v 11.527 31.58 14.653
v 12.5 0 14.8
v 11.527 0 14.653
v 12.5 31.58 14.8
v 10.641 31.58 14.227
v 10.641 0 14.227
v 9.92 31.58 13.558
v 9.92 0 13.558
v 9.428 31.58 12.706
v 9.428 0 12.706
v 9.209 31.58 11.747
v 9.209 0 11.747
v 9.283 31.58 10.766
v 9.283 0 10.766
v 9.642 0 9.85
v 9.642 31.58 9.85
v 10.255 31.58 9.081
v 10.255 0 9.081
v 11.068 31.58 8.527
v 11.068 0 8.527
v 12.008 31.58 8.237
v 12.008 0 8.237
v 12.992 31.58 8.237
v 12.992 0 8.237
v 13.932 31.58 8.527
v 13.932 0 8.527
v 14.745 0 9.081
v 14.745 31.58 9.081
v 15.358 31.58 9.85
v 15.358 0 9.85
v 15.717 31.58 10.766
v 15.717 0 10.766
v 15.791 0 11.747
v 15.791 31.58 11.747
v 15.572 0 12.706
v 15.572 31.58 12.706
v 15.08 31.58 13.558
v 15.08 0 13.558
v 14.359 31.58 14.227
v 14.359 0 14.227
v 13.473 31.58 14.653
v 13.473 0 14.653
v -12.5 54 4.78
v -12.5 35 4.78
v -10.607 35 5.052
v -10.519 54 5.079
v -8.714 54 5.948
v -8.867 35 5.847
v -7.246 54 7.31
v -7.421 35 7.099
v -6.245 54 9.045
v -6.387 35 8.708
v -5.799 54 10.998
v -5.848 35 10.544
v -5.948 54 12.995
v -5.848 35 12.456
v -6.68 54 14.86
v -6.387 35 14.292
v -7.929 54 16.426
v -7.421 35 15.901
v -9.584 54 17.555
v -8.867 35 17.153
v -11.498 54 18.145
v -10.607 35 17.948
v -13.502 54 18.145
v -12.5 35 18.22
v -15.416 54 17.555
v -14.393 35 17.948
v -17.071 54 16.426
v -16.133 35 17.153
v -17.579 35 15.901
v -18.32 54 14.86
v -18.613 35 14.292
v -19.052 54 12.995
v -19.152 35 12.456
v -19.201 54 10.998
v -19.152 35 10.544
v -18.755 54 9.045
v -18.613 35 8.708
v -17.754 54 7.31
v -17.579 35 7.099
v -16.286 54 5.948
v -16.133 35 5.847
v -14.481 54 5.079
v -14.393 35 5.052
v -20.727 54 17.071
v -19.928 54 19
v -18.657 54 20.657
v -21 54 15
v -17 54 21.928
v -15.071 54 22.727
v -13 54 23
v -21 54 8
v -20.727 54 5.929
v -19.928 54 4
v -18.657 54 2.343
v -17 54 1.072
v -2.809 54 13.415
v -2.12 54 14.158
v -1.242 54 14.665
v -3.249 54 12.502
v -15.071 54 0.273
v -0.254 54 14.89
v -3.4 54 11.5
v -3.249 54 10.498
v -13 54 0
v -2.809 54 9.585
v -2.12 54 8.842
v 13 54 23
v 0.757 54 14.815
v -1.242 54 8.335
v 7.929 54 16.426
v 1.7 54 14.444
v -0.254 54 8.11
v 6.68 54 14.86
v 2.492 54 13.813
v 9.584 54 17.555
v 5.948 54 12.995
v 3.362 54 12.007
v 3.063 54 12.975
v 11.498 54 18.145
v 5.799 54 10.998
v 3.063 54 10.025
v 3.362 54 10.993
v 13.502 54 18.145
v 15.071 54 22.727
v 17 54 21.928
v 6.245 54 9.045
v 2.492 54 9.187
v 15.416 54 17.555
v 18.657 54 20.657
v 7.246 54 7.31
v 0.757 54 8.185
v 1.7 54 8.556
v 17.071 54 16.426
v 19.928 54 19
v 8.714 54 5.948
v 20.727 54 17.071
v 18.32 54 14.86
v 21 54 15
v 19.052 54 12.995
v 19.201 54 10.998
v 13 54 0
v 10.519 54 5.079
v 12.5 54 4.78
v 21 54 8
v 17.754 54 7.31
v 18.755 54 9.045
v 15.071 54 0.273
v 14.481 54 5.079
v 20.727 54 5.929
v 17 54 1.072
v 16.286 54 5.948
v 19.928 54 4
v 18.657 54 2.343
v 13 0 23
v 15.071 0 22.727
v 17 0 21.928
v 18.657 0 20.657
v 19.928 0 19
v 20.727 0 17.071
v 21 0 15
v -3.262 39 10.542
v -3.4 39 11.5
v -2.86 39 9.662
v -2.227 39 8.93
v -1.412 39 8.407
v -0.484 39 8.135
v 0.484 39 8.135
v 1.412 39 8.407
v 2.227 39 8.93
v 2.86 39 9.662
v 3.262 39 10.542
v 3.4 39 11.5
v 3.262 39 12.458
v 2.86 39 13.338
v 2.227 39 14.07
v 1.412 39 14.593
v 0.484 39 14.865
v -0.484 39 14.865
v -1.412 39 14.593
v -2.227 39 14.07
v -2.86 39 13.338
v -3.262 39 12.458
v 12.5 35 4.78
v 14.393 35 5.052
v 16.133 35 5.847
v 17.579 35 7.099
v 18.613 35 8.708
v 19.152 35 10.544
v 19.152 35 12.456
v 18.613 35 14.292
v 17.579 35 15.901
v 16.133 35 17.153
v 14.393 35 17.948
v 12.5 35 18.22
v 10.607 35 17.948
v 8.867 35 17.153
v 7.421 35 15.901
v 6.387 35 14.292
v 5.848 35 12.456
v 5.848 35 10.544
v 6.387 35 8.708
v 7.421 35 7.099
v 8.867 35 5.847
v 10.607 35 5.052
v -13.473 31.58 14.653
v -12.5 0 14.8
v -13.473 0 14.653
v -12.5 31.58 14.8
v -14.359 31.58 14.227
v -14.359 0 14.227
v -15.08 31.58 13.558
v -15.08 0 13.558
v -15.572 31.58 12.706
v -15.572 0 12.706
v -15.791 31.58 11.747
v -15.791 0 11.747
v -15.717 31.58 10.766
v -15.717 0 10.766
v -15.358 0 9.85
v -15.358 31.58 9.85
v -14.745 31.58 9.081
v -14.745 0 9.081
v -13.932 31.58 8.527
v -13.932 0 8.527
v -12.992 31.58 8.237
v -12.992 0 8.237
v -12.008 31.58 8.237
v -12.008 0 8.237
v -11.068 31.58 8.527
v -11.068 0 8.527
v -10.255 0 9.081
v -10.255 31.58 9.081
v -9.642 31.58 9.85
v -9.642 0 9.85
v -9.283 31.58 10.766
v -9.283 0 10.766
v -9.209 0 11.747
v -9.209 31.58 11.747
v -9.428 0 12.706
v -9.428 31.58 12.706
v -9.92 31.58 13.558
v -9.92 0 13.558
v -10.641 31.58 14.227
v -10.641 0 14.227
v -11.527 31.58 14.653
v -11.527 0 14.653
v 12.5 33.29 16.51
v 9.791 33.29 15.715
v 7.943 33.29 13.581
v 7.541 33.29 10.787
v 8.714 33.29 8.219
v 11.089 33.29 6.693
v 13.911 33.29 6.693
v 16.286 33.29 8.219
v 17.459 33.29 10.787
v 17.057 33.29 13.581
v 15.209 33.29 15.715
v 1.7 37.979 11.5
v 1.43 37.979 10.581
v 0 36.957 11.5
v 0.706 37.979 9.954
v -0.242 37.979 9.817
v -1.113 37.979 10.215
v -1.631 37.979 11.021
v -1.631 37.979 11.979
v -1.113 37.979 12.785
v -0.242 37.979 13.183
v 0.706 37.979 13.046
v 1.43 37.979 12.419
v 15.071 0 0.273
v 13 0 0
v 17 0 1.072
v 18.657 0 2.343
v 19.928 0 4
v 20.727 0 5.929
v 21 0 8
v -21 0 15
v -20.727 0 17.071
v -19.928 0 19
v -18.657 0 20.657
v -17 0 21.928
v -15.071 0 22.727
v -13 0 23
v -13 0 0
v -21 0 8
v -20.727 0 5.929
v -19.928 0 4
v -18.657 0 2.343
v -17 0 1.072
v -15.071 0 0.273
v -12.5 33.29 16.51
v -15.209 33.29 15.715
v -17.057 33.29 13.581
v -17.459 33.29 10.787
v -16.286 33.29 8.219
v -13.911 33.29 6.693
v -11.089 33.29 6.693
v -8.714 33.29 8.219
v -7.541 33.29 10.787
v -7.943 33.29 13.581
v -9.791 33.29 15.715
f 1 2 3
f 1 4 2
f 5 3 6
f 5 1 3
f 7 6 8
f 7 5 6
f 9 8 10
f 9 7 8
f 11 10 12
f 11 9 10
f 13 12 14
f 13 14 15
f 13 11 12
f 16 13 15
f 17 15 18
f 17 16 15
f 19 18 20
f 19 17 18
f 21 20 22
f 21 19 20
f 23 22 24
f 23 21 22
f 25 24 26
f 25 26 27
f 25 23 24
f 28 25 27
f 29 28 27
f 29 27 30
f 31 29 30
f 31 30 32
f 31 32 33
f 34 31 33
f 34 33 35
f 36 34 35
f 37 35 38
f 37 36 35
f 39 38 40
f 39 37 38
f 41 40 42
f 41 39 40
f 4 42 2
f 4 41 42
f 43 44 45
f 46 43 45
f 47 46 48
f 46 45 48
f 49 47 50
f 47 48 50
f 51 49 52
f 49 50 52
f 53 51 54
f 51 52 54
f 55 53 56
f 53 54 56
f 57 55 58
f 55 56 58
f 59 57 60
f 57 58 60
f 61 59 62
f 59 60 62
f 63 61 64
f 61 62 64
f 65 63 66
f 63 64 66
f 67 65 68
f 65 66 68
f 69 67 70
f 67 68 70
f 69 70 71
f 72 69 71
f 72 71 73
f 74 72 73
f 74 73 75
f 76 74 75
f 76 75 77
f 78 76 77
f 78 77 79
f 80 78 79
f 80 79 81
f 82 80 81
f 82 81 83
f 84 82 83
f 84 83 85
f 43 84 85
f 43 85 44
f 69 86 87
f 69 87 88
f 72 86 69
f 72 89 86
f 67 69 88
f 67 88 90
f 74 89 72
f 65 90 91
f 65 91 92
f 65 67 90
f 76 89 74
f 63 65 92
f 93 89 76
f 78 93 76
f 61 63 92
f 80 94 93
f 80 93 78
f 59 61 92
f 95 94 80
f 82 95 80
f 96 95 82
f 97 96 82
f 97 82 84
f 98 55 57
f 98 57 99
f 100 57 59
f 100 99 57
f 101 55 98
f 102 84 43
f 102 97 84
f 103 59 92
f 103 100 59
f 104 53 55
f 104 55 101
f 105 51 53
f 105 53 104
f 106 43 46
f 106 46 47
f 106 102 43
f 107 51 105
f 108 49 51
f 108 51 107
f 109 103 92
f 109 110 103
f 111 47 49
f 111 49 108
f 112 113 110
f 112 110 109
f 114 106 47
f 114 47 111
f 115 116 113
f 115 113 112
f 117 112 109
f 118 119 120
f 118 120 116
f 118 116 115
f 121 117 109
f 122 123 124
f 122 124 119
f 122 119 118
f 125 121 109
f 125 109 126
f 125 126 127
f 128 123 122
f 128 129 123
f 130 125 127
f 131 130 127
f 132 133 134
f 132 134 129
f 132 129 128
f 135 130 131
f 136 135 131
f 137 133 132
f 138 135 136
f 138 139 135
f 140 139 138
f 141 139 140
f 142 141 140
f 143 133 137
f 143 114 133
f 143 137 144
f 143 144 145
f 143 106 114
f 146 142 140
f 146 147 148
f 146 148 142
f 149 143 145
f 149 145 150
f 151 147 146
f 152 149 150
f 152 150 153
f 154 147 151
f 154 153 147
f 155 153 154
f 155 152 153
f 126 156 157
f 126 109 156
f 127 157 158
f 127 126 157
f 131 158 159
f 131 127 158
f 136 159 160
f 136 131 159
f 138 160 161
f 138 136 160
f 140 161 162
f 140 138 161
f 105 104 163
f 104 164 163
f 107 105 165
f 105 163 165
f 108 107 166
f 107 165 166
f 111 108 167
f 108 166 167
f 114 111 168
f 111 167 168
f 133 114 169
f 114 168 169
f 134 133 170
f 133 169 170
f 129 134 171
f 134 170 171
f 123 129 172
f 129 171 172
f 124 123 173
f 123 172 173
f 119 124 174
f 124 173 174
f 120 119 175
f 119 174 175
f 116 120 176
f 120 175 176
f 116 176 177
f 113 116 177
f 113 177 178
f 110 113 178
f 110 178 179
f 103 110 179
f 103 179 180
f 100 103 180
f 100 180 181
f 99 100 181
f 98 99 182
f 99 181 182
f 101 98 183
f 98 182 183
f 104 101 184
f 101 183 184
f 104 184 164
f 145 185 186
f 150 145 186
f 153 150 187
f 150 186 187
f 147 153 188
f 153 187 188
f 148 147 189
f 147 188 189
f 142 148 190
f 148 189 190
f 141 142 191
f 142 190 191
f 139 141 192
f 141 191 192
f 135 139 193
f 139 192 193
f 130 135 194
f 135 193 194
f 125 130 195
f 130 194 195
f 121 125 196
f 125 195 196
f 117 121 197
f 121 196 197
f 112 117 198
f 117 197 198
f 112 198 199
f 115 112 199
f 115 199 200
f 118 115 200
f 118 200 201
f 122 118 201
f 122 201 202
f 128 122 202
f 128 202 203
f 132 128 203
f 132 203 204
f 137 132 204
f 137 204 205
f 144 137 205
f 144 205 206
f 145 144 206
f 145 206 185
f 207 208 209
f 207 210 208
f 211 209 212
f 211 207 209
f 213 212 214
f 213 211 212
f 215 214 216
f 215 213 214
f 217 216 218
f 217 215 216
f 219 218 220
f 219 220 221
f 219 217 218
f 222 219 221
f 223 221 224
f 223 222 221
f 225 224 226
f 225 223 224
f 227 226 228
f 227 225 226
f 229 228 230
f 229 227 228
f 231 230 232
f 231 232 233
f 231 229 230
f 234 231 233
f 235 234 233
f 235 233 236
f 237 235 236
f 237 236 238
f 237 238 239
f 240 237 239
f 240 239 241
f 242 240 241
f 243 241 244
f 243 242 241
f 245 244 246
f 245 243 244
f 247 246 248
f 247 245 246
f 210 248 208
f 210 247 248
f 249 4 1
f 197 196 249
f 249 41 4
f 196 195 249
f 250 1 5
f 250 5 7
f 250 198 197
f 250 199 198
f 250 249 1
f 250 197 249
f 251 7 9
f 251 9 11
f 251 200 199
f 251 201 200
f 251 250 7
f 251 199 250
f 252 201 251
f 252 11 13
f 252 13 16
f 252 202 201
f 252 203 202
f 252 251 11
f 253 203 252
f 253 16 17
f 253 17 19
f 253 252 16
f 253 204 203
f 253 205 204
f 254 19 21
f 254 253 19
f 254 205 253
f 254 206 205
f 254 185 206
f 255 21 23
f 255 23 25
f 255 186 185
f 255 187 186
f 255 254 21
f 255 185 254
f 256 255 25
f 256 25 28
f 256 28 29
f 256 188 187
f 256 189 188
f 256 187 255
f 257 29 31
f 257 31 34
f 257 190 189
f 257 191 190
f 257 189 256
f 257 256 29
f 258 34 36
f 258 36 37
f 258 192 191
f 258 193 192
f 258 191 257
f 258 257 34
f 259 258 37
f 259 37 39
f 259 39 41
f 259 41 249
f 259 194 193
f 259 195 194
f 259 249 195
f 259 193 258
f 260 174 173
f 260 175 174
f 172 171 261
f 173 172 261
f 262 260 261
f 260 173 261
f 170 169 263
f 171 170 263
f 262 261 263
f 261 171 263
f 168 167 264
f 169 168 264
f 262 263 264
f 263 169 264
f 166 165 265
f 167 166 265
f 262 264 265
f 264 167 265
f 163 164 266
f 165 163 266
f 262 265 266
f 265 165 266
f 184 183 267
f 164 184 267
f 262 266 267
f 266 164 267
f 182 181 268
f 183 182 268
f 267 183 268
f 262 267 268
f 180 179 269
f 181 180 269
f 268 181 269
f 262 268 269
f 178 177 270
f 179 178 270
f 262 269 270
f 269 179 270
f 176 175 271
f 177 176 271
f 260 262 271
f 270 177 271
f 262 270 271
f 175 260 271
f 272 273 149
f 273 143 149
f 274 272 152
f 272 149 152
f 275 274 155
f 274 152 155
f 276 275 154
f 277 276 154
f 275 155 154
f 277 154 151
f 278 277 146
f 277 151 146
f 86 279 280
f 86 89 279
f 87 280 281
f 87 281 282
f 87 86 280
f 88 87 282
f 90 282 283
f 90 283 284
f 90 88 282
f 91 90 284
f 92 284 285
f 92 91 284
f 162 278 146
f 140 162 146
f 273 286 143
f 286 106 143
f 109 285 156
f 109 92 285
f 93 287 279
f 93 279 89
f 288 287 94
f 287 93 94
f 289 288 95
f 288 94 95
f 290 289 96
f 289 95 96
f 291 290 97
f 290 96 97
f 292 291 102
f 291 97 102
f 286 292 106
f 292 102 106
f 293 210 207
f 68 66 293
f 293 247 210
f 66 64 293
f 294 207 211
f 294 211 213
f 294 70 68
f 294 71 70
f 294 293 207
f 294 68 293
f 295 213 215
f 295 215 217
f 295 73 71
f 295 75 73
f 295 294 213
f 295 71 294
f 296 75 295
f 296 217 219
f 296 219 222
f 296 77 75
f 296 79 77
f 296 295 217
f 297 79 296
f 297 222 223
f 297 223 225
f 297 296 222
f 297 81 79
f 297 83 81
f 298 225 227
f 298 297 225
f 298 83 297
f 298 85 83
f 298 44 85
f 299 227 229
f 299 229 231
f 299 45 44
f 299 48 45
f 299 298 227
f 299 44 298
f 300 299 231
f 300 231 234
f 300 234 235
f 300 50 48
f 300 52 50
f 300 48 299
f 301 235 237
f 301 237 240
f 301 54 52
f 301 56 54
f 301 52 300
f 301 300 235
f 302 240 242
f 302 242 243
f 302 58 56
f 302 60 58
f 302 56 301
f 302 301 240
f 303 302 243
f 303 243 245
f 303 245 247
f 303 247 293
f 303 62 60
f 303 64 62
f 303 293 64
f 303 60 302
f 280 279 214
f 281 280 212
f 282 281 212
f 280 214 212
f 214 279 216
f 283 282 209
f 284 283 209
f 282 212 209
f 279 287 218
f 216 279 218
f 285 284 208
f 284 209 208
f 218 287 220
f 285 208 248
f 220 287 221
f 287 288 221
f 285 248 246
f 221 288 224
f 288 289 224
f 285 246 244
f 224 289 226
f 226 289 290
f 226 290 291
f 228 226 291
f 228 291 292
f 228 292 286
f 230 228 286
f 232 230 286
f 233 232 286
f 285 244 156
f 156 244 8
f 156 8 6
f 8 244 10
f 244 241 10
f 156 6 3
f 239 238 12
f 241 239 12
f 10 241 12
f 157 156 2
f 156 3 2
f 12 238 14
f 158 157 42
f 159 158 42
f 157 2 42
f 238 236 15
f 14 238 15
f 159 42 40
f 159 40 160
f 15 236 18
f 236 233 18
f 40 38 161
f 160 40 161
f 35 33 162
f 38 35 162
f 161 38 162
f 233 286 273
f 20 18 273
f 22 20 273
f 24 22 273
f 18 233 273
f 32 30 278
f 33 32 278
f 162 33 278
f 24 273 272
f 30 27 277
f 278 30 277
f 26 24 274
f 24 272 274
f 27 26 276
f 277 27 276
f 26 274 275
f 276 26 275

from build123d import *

# Parameters (mm, degrees)
SKETCH1_W                                    = 42
SKETCH1_H                                    = 54
BOSS_EXTRUDE1_DEPTH                          = 23
M8_TAPPED_HOLE1_D                            = 6.8
M8_TAPPED_HOLE1_DEPTH                        = 15
M8_TAPPED_HOLE1_TIP                          = 2.042926105
CSK_FOR_M6_HEX_SOCKET_COUNTERSUNK_CA_2_COUNT = 2
CSK_FOR_M6_HEX_SOCKET_COUNTERSUNK_CA_2_PITCH = 25
FILLET1_R                                    = 8
SKETCH8_R                                    = 6.72
CUT_EXTRUDE1_DEPTH                           = 47.8508271


with BuildPart() as part:
    # Sketch1 → Boss-Extrude1 (new body)
    with BuildSketch(Plane.XY):
        with Locations((0, 27)):
            Rectangle(SKETCH1_W, SKETCH1_H)
    extrude(amount=BOSS_EXTRUDE1_DEPTH)

    # M8 Tapped Hole1
    with Locations(Plane(origin=(0, 54, 0), x_dir=(1, 0, 0), z_dir=(0, 1, 0))):
        with Locations((0, -11.5)):
            Hole(M8_TAPPED_HOLE1_D / 2, depth=M8_TAPPED_HOLE1_DEPTH)
            with Locations((0, 0, -(M8_TAPPED_HOLE1_DEPTH + M8_TAPPED_HOLE1_TIP / 2))):  # 118° drill point
                Cone(0, M8_TAPPED_HOLE1_D / 2, M8_TAPPED_HOLE1_TIP, mode=Mode.SUBTRACT)

    # Sketch5 → CSK for M6 Hex Socket Countersunk Cap Screw2 (revolve, cut)
    with BuildSketch(Plane(origin=(12.5, 35, 11.5), x_dir=(0, 0, 1), z_dir=(1, 0, 0))):
        Polygon((0, 0), (0, 35), (3.3, 35), (3.3, 3.42), (6.72, 0), align=None)
    csk_for_m6_hex_socket_countersunk_cap_sc = revolve(axis=Axis((12.5, 41.35, 11.5), (0, -1, 0)), mode=Mode.SUBTRACT)

    # CSK for M6 Hex Socket Countersunk Ca 2: CSK for M6 Hex Socket Countersunk Cap Screw2 ×2
    with Locations(*[(-i * CSK_FOR_M6_HEX_SOCKET_COUNTERSUNK_CA_2_PITCH, 0, 0) for i in range(1, CSK_FOR_M6_HEX_SOCKET_COUNTERSUNK_CA_2_COUNT)]):
        add(csk_for_m6_hex_socket_countersunk_cap_sc, mode=Mode.SUBTRACT)

    # Fillet1
    fillet1_edges = [part.edges().sort_by_distance(p)[0] for p in [
        (21, 27, 23),
        (-21, 27, 23),
        (21, 27, 0),
        (-21, 27, 0),
    ]]
    fillet(fillet1_edges, radius=FILLET1_R)

    # Sketch8 → Cut-Extrude1 (cut, through all)
    with BuildSketch(Plane(origin=(0, 35, 0), x_dir=(-1, 0, 0), z_dir=(0, -1, 0))):
        with Locations(Location((12.5, -11.5, 0), (0, 0, 90))):
            Circle(SKETCH8_R)
        with Locations(Location((-12.5, -11.5, 0), (0, 0, 90))):
            Circle(SKETCH8_R)
    extrude(amount=-CUT_EXTRUDE1_DEPTH, mode=Mode.SUBTRACT)


solid = part.part
